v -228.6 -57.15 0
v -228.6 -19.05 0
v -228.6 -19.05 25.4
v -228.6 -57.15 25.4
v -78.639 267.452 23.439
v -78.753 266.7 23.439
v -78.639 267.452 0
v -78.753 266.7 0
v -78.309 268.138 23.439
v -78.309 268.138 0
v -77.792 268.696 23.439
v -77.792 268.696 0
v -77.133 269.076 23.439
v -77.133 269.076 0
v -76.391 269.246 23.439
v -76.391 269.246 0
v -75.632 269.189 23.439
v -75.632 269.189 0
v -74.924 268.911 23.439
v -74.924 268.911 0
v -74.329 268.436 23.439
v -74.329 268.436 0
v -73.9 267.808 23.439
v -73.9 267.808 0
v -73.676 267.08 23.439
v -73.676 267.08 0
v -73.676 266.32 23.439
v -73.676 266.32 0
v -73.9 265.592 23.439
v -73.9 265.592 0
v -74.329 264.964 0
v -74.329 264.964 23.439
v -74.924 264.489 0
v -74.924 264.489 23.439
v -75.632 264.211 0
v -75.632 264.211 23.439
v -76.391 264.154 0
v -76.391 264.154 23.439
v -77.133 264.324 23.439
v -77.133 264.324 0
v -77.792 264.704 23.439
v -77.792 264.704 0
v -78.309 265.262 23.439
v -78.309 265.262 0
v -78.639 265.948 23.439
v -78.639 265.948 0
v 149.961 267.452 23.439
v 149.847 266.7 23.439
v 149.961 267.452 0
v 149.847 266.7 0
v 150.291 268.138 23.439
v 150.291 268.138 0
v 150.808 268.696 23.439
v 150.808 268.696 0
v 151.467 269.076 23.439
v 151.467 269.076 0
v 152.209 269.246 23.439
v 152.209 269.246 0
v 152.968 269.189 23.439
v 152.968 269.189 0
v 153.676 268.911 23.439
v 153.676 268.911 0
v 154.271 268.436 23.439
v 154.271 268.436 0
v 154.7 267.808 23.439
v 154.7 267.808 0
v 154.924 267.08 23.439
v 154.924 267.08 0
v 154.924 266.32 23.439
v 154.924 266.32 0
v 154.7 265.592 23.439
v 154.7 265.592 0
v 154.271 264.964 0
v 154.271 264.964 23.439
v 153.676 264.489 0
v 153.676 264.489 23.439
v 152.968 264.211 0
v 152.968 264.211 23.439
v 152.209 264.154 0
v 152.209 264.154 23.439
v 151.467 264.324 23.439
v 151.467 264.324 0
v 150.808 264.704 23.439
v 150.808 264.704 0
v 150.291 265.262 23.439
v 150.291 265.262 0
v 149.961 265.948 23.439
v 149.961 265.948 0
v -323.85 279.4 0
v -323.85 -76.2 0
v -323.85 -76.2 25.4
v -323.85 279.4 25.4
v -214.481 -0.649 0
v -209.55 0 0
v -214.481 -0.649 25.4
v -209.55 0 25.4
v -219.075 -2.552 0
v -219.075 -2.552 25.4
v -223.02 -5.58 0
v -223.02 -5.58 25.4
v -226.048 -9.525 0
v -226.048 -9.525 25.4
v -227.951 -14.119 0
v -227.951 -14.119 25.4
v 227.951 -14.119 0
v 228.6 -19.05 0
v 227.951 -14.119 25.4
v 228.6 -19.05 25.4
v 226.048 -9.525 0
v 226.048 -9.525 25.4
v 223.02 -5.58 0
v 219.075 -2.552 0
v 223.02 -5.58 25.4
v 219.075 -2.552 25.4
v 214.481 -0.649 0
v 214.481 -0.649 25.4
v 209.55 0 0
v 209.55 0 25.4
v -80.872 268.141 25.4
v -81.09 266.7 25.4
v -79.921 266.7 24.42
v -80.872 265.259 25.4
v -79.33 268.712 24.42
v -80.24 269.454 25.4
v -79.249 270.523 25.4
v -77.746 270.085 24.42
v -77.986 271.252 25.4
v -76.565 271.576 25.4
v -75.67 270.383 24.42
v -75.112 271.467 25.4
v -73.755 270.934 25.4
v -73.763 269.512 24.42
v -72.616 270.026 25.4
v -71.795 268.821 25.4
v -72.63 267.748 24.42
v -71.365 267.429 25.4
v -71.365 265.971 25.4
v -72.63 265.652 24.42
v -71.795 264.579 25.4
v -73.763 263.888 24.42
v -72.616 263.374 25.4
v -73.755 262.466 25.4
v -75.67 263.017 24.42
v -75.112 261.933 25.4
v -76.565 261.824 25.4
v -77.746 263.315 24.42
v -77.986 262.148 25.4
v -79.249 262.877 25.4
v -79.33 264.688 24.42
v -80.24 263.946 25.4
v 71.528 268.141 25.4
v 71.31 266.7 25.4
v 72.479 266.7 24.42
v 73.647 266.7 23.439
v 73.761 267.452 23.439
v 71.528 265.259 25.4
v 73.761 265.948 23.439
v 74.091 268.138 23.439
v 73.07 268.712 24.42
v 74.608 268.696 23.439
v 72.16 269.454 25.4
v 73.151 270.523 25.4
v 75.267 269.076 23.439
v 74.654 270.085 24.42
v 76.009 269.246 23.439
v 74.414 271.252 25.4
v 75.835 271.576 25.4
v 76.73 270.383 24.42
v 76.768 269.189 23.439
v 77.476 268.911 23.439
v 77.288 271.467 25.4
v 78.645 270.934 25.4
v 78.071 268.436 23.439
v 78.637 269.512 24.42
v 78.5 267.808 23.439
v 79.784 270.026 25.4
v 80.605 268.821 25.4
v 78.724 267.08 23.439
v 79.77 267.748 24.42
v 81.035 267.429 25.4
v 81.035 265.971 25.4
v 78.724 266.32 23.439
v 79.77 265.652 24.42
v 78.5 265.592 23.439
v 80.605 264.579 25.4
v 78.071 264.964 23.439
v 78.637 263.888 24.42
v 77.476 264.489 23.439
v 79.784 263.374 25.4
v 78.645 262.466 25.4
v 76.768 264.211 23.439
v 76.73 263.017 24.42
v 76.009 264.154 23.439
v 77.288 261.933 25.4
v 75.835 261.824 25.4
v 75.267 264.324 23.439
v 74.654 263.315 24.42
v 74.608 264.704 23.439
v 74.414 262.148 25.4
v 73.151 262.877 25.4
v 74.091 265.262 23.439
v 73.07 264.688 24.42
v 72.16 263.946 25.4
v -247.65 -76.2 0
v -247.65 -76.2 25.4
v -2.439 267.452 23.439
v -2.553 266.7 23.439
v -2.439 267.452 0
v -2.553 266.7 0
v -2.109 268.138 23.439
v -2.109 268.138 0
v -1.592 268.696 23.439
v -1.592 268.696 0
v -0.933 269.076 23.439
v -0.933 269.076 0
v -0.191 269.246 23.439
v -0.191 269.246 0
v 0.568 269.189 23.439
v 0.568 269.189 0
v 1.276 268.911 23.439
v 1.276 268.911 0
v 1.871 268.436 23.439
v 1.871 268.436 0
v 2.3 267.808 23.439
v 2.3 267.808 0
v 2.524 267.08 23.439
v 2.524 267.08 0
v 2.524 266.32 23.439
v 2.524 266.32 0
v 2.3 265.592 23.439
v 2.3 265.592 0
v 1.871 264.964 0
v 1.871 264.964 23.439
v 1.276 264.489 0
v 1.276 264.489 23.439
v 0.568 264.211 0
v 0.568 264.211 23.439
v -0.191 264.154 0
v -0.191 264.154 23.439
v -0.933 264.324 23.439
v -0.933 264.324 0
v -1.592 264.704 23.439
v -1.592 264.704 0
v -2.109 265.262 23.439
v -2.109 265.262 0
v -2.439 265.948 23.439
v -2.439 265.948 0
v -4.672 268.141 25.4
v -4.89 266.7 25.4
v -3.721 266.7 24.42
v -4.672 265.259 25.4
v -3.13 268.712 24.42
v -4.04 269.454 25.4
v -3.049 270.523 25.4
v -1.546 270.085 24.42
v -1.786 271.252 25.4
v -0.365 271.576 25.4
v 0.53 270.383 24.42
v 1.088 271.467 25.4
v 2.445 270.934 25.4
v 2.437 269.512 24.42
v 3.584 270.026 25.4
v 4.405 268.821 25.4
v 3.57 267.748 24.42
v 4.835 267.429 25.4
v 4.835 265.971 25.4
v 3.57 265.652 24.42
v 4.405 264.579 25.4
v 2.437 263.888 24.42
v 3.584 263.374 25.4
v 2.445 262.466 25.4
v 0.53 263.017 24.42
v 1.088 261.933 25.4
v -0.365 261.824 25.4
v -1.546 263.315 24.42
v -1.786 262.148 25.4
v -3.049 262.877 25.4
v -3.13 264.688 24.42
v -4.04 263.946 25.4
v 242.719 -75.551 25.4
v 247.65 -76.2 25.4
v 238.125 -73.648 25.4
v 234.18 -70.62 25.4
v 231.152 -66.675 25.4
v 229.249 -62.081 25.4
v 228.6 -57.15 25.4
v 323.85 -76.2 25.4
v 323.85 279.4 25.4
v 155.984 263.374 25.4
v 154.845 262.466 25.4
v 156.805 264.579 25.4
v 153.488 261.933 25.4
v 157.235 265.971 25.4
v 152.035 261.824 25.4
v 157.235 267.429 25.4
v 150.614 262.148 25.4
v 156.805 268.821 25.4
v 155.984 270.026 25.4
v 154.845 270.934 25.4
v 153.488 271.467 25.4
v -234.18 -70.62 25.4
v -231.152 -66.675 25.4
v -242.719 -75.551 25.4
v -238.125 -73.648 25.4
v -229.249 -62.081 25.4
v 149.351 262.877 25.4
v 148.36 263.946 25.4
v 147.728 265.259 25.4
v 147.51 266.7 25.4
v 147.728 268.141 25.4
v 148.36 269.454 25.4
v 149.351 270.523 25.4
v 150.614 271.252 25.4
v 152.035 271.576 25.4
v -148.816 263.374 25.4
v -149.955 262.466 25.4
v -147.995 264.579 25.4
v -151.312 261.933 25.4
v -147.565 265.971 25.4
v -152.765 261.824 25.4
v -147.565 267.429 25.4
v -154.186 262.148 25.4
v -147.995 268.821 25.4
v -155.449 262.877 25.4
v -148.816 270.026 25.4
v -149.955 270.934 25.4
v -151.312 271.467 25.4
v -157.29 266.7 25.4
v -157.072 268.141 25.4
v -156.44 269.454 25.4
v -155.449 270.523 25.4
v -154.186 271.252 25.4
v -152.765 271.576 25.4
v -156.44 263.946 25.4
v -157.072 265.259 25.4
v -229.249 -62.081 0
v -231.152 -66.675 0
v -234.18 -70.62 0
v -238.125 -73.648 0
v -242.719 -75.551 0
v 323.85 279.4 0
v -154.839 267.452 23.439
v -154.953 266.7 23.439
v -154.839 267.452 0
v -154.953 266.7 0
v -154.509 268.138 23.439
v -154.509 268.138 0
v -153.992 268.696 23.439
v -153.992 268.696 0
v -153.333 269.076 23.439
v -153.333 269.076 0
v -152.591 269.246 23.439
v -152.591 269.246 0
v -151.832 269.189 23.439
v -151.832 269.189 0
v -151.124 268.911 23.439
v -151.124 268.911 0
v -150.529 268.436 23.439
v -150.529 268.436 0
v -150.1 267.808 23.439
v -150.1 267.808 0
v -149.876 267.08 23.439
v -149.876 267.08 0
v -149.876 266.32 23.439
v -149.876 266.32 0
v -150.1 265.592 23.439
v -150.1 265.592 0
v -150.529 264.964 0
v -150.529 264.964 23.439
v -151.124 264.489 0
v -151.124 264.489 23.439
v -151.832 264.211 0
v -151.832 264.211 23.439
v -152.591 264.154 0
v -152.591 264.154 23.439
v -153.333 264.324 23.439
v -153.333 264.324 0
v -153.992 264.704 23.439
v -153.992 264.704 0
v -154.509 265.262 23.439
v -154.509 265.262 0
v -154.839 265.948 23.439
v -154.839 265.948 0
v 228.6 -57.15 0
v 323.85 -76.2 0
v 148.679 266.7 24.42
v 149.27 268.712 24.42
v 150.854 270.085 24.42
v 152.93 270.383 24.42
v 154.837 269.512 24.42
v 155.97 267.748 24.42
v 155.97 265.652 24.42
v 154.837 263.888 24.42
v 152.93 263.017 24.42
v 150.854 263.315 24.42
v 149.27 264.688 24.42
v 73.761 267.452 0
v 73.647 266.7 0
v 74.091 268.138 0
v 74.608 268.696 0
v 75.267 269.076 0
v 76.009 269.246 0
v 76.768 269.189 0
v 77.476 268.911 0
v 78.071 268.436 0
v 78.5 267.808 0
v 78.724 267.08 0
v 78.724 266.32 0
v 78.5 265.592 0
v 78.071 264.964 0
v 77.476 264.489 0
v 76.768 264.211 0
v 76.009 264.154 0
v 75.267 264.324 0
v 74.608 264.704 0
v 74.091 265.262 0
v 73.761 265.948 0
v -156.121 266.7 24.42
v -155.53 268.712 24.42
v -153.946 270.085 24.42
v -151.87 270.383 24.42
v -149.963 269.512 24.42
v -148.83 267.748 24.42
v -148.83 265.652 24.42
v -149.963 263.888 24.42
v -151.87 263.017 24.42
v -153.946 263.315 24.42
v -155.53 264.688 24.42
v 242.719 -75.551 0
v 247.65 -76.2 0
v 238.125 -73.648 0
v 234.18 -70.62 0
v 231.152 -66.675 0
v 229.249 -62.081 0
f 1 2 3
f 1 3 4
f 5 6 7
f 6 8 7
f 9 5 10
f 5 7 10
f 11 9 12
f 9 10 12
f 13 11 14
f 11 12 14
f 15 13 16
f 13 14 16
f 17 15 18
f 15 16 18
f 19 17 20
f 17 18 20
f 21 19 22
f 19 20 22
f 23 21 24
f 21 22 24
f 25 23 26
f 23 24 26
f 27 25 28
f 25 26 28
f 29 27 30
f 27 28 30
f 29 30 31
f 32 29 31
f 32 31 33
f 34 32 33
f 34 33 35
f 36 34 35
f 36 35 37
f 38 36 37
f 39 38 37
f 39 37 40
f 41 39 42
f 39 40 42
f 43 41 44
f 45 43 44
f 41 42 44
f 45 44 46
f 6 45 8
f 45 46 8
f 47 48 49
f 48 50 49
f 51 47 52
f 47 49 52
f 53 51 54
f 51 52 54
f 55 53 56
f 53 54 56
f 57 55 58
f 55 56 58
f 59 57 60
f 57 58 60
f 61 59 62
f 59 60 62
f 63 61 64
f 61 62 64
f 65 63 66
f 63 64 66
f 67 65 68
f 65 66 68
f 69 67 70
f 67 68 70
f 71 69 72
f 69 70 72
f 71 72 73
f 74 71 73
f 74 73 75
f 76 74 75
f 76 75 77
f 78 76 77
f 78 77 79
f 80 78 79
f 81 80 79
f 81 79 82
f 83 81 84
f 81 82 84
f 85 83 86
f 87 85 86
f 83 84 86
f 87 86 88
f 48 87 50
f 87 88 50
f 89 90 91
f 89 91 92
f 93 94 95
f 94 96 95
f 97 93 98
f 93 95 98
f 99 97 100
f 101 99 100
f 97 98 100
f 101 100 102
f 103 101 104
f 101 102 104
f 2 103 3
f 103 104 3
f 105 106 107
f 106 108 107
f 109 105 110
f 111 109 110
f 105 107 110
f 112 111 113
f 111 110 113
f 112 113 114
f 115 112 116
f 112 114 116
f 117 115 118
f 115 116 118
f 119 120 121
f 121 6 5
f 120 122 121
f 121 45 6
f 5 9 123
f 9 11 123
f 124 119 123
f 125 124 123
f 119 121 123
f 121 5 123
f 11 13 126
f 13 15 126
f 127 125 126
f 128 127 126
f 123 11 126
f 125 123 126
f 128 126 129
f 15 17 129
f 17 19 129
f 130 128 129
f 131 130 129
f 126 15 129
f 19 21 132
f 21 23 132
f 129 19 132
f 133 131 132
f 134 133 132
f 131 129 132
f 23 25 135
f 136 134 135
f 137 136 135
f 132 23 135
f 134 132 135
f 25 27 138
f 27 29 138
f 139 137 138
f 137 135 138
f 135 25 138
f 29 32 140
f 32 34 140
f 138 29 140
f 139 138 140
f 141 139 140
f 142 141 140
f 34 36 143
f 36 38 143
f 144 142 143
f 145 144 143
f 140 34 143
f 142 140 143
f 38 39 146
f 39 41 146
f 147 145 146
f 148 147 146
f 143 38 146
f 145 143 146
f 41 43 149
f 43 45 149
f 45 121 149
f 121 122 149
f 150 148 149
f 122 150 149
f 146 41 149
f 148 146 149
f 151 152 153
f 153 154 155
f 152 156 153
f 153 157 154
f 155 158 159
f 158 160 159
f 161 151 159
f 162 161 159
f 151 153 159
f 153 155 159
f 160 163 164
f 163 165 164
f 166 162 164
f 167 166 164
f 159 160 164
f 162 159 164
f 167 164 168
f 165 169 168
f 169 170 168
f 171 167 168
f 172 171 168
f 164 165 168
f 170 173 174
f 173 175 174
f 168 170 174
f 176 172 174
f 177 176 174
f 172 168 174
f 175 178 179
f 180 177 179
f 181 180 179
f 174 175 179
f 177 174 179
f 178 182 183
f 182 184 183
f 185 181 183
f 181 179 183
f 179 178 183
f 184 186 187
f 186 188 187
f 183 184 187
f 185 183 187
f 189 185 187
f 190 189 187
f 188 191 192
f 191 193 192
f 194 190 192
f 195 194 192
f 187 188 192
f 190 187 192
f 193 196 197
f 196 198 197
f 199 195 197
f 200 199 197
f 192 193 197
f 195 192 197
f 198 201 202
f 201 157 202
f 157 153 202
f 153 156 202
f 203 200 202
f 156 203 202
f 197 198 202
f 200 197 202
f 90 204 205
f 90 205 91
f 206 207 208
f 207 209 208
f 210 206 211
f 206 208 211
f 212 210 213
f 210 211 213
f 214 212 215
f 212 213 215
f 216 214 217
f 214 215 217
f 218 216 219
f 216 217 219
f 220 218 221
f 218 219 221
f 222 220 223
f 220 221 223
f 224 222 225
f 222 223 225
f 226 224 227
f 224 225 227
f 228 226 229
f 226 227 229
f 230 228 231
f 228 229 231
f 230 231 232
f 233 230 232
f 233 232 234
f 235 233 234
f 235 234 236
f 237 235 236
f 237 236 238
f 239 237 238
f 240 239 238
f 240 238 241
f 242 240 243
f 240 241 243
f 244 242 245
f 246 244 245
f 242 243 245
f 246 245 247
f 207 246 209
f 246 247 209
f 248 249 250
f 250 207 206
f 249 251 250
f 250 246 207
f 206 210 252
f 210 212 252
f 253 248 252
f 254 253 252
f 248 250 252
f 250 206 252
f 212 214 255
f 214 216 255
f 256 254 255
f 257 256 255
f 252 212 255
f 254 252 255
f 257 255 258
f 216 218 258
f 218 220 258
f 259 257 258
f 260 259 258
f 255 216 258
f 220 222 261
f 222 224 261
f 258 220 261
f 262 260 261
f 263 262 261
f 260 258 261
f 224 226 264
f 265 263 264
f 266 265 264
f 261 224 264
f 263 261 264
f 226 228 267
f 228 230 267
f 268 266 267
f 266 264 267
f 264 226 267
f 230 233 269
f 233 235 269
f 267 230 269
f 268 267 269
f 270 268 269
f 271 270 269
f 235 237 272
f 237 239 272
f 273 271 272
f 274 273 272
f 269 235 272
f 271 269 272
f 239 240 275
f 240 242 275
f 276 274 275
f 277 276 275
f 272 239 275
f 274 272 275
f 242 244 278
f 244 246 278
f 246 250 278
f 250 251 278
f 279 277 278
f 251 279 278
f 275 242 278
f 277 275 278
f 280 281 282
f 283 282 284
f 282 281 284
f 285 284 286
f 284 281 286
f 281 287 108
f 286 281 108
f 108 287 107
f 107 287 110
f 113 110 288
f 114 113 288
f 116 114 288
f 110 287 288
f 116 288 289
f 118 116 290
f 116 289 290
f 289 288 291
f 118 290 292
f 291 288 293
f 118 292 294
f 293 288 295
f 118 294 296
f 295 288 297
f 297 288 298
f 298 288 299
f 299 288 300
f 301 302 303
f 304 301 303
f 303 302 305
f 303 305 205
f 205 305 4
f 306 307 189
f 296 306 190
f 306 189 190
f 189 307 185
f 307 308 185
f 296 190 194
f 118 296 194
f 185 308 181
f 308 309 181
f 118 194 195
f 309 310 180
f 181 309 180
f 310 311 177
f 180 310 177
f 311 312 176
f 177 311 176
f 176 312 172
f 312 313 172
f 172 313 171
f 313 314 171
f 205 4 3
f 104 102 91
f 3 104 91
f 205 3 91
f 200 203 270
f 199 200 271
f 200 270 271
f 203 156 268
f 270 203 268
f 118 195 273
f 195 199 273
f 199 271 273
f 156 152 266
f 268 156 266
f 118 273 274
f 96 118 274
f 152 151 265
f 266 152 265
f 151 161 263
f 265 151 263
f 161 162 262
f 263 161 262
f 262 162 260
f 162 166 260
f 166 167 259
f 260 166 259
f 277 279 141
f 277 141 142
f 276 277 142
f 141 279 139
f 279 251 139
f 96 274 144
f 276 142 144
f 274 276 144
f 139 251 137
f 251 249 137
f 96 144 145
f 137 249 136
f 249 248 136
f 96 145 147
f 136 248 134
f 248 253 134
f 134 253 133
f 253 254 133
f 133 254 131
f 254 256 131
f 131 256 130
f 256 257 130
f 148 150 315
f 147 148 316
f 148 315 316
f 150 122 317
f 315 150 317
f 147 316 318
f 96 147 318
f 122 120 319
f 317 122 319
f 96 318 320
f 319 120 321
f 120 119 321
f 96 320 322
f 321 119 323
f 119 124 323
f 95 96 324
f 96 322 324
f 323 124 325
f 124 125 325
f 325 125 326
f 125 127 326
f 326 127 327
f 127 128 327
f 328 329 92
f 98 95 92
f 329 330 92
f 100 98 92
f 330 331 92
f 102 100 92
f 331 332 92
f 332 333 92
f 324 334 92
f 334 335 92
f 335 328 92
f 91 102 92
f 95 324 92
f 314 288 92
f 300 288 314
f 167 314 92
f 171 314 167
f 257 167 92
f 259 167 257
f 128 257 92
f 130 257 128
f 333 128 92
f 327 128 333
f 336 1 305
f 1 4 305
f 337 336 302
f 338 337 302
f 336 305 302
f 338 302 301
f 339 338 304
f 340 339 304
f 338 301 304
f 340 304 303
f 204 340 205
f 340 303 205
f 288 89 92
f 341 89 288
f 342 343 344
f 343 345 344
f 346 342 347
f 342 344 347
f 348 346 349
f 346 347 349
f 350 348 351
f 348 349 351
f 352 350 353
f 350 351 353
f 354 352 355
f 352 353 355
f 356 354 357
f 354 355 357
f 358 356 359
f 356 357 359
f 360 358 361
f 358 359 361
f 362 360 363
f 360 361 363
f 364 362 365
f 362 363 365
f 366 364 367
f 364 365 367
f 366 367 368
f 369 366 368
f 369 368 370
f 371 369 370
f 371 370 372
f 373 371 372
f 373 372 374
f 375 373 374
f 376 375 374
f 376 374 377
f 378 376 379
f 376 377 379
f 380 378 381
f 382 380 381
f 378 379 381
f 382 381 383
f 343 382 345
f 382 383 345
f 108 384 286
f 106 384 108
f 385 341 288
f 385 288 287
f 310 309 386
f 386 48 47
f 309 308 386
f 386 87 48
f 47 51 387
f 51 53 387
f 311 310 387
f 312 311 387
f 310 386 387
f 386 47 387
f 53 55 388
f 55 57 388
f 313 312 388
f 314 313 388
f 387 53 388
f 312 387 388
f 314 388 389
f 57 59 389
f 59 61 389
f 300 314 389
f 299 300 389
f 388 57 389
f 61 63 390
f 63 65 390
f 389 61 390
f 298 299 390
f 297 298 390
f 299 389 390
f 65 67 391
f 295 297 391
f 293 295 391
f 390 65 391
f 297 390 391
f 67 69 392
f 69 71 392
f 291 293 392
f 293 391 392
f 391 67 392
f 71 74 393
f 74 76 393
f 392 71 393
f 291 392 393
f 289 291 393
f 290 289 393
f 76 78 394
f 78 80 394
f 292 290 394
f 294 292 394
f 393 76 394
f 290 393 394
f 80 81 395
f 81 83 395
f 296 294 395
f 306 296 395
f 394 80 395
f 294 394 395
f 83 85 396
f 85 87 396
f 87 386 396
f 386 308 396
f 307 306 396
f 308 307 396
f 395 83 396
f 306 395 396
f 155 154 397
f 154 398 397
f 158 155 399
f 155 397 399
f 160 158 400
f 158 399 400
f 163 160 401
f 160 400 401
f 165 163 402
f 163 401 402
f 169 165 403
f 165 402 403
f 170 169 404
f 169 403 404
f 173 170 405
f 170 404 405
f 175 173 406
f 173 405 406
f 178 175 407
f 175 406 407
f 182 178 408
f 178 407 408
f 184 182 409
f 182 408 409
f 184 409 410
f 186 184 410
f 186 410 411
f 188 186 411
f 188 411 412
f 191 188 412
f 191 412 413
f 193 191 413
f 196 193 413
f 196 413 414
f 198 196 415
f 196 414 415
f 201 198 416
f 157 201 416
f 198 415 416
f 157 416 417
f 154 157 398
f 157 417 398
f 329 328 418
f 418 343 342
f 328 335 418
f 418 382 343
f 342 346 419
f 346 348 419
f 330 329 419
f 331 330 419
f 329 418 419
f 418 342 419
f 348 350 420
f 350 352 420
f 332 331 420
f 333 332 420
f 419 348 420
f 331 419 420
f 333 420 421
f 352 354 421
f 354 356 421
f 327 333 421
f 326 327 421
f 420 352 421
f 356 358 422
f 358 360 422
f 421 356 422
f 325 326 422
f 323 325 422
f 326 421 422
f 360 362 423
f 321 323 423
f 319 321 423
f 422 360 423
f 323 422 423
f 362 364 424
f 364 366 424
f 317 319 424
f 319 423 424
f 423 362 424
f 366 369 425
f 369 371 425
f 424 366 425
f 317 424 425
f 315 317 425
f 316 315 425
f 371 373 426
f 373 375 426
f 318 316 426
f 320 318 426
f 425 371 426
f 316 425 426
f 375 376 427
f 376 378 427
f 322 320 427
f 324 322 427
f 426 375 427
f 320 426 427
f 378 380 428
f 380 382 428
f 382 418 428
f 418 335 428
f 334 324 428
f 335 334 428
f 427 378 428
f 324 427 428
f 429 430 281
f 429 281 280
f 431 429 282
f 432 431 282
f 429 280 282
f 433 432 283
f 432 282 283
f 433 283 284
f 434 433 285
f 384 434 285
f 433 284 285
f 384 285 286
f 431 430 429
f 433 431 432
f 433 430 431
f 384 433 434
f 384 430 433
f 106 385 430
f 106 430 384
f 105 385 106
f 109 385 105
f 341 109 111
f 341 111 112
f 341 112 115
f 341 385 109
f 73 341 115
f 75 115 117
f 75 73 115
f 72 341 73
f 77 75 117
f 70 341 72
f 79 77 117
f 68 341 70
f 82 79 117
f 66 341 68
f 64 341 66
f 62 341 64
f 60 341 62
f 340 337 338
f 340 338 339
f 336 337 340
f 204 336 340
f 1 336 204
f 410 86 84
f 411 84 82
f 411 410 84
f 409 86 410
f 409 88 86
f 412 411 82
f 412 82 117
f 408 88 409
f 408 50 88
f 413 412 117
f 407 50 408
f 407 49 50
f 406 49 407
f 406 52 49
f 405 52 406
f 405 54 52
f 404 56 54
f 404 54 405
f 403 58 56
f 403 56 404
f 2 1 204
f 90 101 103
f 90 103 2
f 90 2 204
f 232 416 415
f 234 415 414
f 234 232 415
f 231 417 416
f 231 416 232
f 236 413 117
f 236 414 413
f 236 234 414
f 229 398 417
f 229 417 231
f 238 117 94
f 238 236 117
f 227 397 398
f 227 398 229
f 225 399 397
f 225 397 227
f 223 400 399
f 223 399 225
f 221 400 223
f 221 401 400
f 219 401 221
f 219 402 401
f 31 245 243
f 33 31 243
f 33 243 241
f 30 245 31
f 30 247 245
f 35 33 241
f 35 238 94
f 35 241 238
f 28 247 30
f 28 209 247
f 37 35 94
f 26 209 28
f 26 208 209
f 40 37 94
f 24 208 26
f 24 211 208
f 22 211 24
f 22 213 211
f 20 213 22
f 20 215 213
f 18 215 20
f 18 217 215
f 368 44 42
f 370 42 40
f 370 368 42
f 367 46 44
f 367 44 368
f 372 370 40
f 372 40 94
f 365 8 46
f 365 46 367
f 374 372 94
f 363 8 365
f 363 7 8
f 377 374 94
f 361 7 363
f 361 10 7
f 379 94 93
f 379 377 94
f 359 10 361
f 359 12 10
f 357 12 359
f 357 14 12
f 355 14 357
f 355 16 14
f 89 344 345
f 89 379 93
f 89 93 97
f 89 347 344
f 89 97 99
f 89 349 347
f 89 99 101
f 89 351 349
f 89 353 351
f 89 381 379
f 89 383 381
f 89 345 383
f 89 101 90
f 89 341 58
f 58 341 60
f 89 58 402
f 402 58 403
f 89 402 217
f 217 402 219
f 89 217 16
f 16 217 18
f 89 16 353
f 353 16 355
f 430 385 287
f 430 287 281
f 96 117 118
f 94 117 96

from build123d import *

# Parameters (mm, degrees)
BOSS_EXTRUDE1_DEPTH                                = 25.4
FILLET1_R                                          = 19.05
CSK_FOR_10_FLAT_HEAD_MACHINE_SCREW_100_D           = 5.1054
CSK_FOR_10_FLAT_HEAD_MACHINE_SCREW_100_CSINK_D     = 9.779
CSK_FOR_10_FLAT_HEAD_MACHINE_SCREW_100_CSINK_ANGLE = 100


with BuildPart() as part:
    # Sketch1 → Boss-Extrude1 (new body)
    with BuildSketch(Plane.XY):
        Polygon((-323.85, 279.4), (323.85, 279.4), (323.85, -76.2), (228.6, -76.2), (228.6, 0), (-228.6, 0), (-228.6, -76.2), (-323.85, -76.2), align=None)
    extrude(amount=BOSS_EXTRUDE1_DEPTH)

    # Fillet1
    fillet1_edges = [part.edges().sort_by_distance(p)[0] for p in [
        (228.6, -76.2, 12.7),
        (228.6, 0, 12.7),
        (-228.6, 0, 12.7),
        (-228.6, -76.2, 12.7),
    ]]
    fillet(fillet1_edges, radius=FILLET1_R)

    # CSK for #10 Flat Head Machine Screw (100)1 (through all)
    with Locations(Plane.XY.offset(25.4)):
        with Locations((0, 266.7), (76.2, 266.7), (152.4, 266.7), (-76.2, 266.7), (-152.4, 266.7)):
            CounterSinkHole(CSK_FOR_10_FLAT_HEAD_MACHINE_SCREW_100_D / 2, CSK_FOR_10_FLAT_HEAD_MACHINE_SCREW_100_CSINK_D / 2, counter_sink_angle=CSK_FOR_10_FLAT_HEAD_MACHINE_SCREW_100_CSINK_ANGLE)


solid = part.part
